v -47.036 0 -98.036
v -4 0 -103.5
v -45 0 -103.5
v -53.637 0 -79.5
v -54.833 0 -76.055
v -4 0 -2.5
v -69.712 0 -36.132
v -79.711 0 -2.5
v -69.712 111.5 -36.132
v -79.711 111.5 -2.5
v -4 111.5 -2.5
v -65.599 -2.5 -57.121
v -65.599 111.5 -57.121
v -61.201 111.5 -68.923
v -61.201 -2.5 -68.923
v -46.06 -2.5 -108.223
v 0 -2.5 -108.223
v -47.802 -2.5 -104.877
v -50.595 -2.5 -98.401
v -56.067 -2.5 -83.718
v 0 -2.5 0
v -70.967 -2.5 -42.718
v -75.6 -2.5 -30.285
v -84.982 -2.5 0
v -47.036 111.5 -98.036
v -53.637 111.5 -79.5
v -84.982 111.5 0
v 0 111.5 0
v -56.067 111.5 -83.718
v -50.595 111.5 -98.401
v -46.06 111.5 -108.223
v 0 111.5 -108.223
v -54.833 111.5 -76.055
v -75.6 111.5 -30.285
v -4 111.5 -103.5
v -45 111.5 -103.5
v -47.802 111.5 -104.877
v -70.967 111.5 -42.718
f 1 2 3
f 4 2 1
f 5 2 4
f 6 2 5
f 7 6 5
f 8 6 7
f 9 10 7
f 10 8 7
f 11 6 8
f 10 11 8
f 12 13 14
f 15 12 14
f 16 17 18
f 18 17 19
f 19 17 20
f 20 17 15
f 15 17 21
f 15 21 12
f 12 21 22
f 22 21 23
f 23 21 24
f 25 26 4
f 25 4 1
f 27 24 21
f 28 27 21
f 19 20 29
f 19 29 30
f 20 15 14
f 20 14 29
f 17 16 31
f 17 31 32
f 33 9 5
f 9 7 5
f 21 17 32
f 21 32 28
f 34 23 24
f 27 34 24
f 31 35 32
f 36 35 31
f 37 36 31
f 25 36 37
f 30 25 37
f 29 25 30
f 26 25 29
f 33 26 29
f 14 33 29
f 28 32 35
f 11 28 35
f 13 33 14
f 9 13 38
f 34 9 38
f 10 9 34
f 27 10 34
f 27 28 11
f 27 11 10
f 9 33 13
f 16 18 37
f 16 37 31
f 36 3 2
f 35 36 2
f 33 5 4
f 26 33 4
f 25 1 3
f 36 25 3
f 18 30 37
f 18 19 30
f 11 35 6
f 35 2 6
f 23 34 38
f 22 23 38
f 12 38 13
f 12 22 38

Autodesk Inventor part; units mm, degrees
ref_plane "YZ Plane" through (0, 0, 0) normal (1, 0, 0) x (0, 1, 0)
ref_plane "XZ Plane" through (0, 0, 0) normal (0, 1, 0) x (-1, 0, 0)
ref_plane "XY Plane" through (0, 0, 0) normal (0, 0, 1) x (1, 0, 0)
sketch "Sketch1" plane through (0, 0, 0) normal (0, 1, 0) x (-1, 0, 0)
  line L0 (4, -2.4997) -> (79.711, -2.4997)
  line L1 (4, -103.4997) -> (4, -2.4997)
  line L2 (45, -103.4997) -> (4, -103.4997)
  line L3 (69.7122, -36.1325) -> (54.8327, -76.055)
  line L4 (54.8327, -76.055) -> (53.637, -79.4997)
  line L5 (53.637, -79.4997) -> (47.0364, -98.0359)
  line L6 (47.0364, -98.0359) -> (45, -103.4997)
  line L7 (79.711, -2.4997) -> (69.7122, -36.1325)
  line L8 (84.9819, 0) -> (0, 0)
  line L9 (75.6001, -30.2846) -> (84.9819, 0)
  line L10 (84.9819, 0) -> (75.6001, -30.2846)
  line L11 (70.9666, -42.7177) -> (65.5988, -57.1214)
  line L12 (61.2006, -68.9229) -> (56.067, -83.7178)
  line L13 (75.6001, -30.2846) -> (61.2006, -68.9229)
  line L14 (47.8016, -104.8767) -> (46.0595, -108.2232)
  line L15 (50.5948, -98.4014) -> (47.8016, -104.8767)
  line L16 (56.067, -83.7178) -> (50.5948, -98.4014)
  line L17 (0, -108.2232) -> (0, 0)
  line L18 (46.0595, -108.2232) -> (0, -108.2232)
  point P0 (0, 0)
  point P1 (-1, 0)
extrude "Extrusion1" add sketch "Sketch1" against normal blind 2.5 contours L0 L7 L3 L4 L5 L6 L2 L1 | L9 L13 L11 L12 L16 L15 L14 L18 L17 L8
extrude "Extrusion2" add sketch "Sketch1" along normal blind 111.5
properties part number "phoneBucketV2"
